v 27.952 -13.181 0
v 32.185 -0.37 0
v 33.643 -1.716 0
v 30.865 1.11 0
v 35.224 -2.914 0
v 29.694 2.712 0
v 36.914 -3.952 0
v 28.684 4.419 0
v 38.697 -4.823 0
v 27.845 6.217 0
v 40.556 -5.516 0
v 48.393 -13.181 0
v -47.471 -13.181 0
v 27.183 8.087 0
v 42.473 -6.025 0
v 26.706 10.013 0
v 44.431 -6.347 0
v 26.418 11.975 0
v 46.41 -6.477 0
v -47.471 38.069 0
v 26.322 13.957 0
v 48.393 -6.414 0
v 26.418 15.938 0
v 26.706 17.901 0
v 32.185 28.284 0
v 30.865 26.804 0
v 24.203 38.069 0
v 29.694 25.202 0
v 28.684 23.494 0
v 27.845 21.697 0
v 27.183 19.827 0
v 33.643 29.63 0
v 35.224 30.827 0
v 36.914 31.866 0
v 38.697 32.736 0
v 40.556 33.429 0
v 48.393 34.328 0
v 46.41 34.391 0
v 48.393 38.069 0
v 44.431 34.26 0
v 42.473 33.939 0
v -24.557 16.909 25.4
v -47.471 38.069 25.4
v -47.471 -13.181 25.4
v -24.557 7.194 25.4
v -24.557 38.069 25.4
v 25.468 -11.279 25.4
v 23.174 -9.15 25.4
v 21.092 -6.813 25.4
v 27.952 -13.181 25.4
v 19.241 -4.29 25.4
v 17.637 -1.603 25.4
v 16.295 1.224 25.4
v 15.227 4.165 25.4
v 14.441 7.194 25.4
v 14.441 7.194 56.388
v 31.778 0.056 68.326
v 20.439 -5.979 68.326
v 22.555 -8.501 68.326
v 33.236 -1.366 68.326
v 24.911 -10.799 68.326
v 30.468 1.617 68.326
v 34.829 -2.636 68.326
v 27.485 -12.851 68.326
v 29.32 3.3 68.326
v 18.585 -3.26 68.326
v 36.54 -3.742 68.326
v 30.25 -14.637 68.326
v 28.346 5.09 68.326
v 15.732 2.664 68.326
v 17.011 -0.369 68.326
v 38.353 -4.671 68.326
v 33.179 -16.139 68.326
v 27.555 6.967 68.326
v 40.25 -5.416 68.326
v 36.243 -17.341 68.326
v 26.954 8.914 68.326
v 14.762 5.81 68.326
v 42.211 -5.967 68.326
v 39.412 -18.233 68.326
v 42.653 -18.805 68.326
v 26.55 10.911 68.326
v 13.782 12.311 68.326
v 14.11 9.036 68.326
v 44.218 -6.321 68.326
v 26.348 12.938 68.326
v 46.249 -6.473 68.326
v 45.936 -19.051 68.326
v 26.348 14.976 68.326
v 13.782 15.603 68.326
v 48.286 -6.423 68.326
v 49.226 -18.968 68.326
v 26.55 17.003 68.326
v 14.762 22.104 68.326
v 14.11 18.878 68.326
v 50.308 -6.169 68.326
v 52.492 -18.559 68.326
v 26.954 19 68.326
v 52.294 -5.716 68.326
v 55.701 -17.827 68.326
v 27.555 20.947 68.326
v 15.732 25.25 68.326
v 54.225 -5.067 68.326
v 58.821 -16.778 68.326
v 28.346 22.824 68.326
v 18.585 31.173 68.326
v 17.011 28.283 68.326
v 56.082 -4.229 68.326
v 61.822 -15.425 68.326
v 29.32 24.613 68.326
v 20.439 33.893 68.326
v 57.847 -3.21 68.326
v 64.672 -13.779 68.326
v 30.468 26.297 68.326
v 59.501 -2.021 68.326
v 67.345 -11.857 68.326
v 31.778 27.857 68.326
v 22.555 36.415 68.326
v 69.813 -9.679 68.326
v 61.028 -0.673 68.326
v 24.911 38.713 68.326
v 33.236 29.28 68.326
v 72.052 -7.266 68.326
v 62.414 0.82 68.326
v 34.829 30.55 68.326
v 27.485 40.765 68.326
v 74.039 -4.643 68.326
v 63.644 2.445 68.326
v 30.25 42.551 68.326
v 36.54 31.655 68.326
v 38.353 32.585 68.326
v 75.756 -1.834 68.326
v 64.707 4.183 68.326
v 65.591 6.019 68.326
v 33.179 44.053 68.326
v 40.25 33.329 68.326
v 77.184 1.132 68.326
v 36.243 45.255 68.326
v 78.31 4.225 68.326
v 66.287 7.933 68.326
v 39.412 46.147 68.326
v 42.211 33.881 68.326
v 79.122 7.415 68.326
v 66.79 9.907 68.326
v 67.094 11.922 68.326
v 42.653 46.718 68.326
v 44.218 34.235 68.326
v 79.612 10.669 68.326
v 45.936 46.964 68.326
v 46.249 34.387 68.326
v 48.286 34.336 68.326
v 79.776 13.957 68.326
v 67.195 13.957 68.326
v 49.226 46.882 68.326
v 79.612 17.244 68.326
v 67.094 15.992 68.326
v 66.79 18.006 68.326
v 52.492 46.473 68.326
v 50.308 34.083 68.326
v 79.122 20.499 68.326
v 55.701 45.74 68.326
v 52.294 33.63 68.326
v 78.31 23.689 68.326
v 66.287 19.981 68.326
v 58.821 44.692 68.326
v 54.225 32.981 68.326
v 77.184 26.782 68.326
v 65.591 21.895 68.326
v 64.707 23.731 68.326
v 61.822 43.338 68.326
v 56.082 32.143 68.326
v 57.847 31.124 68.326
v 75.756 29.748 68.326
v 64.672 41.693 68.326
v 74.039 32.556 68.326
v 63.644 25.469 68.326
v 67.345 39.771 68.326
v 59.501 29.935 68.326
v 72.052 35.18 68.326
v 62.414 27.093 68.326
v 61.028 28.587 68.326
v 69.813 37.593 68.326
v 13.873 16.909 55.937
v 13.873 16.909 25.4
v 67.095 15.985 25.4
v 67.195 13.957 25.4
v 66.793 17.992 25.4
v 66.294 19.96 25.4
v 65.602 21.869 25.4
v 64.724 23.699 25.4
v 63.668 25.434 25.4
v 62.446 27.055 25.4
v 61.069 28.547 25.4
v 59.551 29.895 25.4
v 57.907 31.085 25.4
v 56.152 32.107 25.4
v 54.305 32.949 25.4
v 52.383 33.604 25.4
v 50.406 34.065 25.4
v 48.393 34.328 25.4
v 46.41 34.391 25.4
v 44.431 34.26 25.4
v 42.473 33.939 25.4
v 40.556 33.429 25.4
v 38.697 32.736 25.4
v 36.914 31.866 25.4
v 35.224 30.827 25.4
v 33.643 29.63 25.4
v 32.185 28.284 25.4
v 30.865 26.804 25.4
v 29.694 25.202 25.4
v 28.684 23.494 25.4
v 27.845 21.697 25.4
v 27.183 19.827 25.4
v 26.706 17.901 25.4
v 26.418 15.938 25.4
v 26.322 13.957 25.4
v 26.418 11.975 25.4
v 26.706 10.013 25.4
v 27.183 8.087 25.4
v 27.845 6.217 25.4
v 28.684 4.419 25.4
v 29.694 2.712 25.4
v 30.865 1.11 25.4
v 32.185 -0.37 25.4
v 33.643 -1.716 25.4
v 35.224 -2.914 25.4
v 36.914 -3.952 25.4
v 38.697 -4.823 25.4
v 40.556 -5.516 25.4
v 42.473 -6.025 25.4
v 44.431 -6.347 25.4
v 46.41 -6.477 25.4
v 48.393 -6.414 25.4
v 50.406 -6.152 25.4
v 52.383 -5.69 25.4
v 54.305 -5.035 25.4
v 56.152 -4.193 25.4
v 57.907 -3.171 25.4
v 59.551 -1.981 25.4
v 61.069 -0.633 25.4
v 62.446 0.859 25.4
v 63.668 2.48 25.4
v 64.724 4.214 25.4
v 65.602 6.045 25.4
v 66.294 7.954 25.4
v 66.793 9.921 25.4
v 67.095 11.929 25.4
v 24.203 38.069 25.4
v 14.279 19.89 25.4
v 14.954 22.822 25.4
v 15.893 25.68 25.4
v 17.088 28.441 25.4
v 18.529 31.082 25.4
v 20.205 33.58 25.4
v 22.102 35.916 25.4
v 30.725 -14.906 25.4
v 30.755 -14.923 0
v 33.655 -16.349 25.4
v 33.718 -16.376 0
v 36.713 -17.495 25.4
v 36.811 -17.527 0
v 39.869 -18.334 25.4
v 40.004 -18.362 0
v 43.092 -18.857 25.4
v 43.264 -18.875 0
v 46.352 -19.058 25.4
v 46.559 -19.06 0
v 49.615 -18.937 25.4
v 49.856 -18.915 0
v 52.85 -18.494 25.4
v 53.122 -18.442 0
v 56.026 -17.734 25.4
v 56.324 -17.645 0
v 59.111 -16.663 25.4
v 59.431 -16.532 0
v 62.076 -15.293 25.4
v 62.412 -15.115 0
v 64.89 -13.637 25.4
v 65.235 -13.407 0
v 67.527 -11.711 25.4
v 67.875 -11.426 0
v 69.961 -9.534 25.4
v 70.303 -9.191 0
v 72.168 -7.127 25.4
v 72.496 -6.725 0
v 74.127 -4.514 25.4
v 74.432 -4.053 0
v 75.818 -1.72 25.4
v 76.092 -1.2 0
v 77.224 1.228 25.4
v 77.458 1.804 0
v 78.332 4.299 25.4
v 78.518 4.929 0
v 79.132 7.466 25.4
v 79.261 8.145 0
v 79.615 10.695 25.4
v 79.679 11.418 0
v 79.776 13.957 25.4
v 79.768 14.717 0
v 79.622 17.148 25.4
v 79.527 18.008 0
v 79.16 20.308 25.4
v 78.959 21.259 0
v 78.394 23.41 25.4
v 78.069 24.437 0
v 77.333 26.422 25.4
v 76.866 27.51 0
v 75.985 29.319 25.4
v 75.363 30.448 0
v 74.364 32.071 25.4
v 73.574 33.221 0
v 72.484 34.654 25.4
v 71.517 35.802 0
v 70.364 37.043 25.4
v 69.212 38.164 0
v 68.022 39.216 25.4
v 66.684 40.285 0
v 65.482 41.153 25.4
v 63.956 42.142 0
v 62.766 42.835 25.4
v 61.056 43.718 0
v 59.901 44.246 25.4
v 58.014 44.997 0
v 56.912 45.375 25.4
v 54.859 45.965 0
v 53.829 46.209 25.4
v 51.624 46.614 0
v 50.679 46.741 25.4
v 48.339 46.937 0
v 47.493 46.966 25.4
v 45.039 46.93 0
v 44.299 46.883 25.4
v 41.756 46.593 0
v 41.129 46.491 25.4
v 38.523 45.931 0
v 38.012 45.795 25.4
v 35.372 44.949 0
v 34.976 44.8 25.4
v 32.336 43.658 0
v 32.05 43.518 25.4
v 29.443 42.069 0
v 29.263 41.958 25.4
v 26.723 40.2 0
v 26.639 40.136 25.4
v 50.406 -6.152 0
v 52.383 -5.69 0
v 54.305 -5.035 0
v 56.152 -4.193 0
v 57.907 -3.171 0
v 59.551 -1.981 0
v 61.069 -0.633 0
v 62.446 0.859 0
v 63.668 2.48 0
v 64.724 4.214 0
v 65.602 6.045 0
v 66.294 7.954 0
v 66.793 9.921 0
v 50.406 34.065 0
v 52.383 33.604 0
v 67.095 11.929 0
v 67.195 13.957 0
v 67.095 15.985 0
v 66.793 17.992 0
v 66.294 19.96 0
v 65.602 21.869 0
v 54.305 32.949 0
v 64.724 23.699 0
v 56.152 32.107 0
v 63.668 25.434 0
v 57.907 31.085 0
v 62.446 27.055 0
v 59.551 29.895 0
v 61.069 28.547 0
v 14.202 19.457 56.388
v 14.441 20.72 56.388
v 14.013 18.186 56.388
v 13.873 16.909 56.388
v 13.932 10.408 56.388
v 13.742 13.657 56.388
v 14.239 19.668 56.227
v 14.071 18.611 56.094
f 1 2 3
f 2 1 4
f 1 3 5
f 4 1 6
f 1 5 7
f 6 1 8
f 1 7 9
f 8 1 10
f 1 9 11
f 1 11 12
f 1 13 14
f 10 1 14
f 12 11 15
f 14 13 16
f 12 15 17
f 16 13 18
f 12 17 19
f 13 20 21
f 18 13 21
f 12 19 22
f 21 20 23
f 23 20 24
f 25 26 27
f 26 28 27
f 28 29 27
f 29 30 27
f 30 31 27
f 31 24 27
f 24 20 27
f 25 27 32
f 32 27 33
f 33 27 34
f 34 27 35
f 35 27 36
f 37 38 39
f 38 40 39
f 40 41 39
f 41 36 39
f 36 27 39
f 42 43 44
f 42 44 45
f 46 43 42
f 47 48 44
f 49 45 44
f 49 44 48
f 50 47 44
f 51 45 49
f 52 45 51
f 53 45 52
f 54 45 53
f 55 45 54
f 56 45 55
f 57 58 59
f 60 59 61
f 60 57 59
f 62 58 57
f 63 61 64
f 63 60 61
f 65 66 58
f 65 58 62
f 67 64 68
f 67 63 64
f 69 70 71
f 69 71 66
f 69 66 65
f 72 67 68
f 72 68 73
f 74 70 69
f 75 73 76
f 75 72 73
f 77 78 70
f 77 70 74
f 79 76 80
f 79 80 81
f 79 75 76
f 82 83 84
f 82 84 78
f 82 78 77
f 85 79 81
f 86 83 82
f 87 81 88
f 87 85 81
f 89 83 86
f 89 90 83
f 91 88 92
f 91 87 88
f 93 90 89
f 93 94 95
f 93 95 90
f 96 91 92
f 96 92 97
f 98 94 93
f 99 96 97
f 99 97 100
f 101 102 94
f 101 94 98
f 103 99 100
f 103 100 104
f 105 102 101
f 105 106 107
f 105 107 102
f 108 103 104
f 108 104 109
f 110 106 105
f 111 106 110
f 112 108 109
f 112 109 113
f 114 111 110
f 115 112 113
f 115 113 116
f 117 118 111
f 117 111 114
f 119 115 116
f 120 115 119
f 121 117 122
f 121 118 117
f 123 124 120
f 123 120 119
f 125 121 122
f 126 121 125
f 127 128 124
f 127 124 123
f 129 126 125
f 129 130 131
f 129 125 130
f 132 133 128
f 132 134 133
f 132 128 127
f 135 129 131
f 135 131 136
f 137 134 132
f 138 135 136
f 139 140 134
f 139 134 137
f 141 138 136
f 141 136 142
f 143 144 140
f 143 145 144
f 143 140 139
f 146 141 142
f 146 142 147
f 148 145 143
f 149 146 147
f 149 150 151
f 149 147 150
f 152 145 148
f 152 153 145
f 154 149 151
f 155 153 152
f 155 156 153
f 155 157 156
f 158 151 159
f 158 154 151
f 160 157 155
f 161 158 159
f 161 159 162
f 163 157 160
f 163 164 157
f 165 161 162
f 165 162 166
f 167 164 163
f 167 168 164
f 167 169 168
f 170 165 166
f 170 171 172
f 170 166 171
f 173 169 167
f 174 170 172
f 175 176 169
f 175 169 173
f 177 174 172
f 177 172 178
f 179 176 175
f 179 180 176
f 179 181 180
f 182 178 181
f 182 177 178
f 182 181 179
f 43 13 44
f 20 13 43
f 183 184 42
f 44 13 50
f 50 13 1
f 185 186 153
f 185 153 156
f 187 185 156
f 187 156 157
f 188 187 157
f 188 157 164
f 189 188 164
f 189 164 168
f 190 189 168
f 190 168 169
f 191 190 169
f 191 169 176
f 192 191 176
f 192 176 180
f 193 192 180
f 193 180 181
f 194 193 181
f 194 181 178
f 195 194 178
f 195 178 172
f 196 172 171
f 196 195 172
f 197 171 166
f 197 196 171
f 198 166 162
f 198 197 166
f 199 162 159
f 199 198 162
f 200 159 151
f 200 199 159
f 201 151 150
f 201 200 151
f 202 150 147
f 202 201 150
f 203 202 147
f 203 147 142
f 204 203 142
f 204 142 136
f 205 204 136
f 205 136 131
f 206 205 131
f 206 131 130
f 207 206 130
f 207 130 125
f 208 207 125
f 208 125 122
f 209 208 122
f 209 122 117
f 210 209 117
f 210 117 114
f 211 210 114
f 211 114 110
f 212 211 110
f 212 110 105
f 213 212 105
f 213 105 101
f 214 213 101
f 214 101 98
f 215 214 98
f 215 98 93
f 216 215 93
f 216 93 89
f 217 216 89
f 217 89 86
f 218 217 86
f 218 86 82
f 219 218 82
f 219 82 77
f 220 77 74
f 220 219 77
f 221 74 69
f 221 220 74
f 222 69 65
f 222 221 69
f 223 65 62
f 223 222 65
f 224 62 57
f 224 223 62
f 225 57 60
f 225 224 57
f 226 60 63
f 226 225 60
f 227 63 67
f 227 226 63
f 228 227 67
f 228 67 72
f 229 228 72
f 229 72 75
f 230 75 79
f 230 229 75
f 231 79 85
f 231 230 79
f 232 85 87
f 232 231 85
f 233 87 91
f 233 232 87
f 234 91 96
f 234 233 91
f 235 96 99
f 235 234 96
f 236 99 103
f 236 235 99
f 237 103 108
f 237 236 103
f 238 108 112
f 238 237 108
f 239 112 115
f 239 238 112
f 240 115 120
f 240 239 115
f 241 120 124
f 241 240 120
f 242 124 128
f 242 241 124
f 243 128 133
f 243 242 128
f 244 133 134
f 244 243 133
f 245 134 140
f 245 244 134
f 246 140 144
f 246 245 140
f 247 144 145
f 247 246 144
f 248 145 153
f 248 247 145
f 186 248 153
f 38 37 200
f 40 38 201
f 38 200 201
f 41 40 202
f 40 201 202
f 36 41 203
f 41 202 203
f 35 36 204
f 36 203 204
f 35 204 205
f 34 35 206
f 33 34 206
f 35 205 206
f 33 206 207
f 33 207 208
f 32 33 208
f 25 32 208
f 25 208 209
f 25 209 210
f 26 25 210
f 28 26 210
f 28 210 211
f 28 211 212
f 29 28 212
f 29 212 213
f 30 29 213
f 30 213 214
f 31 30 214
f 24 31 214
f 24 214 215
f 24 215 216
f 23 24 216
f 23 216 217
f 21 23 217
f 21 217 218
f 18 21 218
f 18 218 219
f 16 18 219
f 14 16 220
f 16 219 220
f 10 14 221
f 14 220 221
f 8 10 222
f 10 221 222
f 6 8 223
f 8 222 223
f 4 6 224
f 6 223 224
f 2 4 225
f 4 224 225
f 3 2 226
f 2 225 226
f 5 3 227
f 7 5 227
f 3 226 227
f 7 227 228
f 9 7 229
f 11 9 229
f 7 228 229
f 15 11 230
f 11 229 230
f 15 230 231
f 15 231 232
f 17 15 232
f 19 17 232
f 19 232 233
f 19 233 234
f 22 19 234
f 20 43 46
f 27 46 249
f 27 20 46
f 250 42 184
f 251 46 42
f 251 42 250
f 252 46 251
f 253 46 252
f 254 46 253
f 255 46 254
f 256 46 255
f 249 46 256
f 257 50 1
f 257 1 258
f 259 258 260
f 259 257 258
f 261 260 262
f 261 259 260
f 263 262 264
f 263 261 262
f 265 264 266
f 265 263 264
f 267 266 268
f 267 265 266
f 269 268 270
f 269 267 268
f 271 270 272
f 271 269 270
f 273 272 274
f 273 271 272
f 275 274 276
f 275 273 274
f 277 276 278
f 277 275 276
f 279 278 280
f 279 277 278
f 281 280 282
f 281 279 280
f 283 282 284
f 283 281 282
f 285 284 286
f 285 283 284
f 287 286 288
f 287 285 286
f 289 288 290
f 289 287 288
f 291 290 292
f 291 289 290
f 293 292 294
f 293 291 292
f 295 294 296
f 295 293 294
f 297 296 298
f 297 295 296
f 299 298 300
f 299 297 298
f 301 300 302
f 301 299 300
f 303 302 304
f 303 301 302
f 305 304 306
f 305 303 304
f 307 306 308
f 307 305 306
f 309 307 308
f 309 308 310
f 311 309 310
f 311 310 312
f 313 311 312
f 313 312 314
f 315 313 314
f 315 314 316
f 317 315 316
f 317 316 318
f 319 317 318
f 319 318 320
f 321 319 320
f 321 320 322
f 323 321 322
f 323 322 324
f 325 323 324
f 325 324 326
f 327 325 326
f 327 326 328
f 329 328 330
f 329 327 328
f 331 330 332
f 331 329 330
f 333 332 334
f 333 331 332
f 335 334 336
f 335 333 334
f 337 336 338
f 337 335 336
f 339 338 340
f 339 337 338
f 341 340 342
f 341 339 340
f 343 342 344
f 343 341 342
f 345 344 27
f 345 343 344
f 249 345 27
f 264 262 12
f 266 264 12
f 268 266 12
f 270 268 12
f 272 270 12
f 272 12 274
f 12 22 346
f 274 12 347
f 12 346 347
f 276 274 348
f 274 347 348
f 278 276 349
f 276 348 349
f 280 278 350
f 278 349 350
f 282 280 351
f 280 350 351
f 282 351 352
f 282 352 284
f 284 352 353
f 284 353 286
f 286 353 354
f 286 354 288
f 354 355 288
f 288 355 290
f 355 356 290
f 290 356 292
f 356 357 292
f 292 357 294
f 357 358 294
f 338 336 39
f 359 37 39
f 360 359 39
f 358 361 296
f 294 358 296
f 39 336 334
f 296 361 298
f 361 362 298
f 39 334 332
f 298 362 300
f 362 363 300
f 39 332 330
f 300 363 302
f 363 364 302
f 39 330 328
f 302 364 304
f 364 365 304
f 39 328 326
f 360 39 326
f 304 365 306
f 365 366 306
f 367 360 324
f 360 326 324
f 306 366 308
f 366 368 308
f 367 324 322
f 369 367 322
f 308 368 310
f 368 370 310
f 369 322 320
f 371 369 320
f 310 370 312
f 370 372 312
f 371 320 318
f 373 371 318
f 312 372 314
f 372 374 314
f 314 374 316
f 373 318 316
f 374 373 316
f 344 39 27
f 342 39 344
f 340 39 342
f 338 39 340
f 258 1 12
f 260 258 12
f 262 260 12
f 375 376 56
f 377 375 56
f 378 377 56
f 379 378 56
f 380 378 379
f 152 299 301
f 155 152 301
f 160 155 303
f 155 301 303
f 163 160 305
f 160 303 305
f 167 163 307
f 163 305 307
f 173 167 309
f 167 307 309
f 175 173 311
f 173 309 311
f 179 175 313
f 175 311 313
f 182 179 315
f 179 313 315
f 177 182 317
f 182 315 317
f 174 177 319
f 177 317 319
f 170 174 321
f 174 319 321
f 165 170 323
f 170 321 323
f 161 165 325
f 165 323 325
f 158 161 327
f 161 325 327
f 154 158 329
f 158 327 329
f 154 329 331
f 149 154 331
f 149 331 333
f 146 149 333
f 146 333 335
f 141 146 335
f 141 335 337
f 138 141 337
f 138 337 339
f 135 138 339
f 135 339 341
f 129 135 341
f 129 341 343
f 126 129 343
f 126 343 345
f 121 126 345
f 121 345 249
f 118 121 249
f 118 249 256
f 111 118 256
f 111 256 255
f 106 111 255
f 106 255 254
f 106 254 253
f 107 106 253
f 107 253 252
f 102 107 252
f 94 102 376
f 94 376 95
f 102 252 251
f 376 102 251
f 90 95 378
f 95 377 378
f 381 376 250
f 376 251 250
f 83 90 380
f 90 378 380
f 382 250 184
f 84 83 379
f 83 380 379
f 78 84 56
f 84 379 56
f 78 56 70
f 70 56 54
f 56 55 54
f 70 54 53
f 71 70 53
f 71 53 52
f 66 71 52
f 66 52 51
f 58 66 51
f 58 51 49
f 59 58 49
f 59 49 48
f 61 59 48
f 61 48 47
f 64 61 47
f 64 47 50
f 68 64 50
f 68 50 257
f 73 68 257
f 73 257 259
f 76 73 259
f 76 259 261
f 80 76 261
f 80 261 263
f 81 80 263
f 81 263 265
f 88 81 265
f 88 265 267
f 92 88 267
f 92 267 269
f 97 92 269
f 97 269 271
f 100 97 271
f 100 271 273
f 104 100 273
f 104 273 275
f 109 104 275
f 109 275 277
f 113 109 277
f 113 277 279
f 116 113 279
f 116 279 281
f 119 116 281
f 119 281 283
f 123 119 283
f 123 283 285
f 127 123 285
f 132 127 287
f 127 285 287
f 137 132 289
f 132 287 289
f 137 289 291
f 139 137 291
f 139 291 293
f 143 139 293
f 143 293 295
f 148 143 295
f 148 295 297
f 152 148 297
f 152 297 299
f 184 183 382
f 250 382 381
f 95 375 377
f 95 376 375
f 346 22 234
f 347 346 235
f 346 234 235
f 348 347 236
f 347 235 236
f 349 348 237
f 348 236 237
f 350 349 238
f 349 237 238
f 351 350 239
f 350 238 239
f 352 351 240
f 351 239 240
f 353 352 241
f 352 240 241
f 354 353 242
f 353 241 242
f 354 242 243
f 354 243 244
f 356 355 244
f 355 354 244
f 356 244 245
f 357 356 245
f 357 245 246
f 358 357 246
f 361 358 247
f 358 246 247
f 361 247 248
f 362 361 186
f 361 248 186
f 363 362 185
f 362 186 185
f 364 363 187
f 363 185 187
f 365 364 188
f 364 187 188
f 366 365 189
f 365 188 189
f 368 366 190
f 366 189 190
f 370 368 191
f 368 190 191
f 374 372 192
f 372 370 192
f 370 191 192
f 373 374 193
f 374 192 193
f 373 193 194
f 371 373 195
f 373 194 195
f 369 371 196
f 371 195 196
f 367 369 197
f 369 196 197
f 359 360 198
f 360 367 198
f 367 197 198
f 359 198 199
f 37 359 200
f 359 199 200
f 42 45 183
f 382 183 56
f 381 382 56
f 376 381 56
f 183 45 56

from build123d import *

# Parameters (mm, degrees)
F0_W     = 95.8645157516
F0_H     = 51.2506449595
F1_DEPTH = 25.4
F2_R     = 33.0176630578
F2_R_2   = 20.4366091001
F3_DEPTH = 42.926
F4_DEPTH = 25.4
F5_DEPTH = 26.67
F7_DEPTH = 30.988
F9_DEPTH = 69.596


with BuildPart() as f1:
    # F0 (on Top) → F1 (new body)
    with BuildSketch(Plane.XY):
        with Locations((0.4608873278, 12.4439517967)):
            Rectangle(F0_W, F0_H)
    extrude(amount=F1_DEPTH)

    # F2 (on face) → F3 (join)
    with BuildSketch(Plane.XY.offset(25.4)):
        with Locations((46.7587672174, 13.9568671584)):
            Circle(F2_R)
        with Locations((46.7587672174, 13.9568671584)):
            Circle(F2_R_2, mode=Mode.SUBTRACT)
    extrude(amount=F3_DEPTH)

    # F4 (add): a face of the model
    f4_faces = [f1.faces().sort_by_distance(p)[0] for p in [
        (61.6753891644, -14.5284210857, 25.4),
    ]]
    extrude(f4_faces, amount=F4_DEPTH)

    # F5 (cut): a face of the model
    f5_faces = [f1.faces().sort_by_distance(p)[0] for p in [
        (38.9613968277, 13.9568671584, 25.4),
    ]]
    extrude(f5_faces, amount=-F5_DEPTH, mode=Mode.SUBTRACT)

    # F6 (on face) → F7 (join)
    with BuildSketch(Plane.XY.offset(25.4)):
        with BuildLine():
            Line((-24.5569236669, 16.9090367761), (-24.5569236669, 7.1940356866))
            Line((-24.5569236669, 7.1940356866), (14.4411221256, 7.1940356866))
            ThreePointArc((14.4411221256, 7.1940356866), (13.797347404, 12.0305033086), (13.8733484372, 16.9090367761))
            Line((13.8733484372, 16.9090367761), (-24.5569236669, 16.9090367761))
        make_face()
    extrude(amount=F7_DEPTH)

    # F8 (on face) → F9 (cut)
    with BuildSketch(Plane.XZ.offset(-7.1940356866)):
        Polygon((-24.5569236669, 56.388), (-24.5569236669, 25.4), (14.4411221256, 56.388), align=None)
    extrude(amount=-F9_DEPTH, mode=Mode.SUBTRACT)


solid = f1.part
